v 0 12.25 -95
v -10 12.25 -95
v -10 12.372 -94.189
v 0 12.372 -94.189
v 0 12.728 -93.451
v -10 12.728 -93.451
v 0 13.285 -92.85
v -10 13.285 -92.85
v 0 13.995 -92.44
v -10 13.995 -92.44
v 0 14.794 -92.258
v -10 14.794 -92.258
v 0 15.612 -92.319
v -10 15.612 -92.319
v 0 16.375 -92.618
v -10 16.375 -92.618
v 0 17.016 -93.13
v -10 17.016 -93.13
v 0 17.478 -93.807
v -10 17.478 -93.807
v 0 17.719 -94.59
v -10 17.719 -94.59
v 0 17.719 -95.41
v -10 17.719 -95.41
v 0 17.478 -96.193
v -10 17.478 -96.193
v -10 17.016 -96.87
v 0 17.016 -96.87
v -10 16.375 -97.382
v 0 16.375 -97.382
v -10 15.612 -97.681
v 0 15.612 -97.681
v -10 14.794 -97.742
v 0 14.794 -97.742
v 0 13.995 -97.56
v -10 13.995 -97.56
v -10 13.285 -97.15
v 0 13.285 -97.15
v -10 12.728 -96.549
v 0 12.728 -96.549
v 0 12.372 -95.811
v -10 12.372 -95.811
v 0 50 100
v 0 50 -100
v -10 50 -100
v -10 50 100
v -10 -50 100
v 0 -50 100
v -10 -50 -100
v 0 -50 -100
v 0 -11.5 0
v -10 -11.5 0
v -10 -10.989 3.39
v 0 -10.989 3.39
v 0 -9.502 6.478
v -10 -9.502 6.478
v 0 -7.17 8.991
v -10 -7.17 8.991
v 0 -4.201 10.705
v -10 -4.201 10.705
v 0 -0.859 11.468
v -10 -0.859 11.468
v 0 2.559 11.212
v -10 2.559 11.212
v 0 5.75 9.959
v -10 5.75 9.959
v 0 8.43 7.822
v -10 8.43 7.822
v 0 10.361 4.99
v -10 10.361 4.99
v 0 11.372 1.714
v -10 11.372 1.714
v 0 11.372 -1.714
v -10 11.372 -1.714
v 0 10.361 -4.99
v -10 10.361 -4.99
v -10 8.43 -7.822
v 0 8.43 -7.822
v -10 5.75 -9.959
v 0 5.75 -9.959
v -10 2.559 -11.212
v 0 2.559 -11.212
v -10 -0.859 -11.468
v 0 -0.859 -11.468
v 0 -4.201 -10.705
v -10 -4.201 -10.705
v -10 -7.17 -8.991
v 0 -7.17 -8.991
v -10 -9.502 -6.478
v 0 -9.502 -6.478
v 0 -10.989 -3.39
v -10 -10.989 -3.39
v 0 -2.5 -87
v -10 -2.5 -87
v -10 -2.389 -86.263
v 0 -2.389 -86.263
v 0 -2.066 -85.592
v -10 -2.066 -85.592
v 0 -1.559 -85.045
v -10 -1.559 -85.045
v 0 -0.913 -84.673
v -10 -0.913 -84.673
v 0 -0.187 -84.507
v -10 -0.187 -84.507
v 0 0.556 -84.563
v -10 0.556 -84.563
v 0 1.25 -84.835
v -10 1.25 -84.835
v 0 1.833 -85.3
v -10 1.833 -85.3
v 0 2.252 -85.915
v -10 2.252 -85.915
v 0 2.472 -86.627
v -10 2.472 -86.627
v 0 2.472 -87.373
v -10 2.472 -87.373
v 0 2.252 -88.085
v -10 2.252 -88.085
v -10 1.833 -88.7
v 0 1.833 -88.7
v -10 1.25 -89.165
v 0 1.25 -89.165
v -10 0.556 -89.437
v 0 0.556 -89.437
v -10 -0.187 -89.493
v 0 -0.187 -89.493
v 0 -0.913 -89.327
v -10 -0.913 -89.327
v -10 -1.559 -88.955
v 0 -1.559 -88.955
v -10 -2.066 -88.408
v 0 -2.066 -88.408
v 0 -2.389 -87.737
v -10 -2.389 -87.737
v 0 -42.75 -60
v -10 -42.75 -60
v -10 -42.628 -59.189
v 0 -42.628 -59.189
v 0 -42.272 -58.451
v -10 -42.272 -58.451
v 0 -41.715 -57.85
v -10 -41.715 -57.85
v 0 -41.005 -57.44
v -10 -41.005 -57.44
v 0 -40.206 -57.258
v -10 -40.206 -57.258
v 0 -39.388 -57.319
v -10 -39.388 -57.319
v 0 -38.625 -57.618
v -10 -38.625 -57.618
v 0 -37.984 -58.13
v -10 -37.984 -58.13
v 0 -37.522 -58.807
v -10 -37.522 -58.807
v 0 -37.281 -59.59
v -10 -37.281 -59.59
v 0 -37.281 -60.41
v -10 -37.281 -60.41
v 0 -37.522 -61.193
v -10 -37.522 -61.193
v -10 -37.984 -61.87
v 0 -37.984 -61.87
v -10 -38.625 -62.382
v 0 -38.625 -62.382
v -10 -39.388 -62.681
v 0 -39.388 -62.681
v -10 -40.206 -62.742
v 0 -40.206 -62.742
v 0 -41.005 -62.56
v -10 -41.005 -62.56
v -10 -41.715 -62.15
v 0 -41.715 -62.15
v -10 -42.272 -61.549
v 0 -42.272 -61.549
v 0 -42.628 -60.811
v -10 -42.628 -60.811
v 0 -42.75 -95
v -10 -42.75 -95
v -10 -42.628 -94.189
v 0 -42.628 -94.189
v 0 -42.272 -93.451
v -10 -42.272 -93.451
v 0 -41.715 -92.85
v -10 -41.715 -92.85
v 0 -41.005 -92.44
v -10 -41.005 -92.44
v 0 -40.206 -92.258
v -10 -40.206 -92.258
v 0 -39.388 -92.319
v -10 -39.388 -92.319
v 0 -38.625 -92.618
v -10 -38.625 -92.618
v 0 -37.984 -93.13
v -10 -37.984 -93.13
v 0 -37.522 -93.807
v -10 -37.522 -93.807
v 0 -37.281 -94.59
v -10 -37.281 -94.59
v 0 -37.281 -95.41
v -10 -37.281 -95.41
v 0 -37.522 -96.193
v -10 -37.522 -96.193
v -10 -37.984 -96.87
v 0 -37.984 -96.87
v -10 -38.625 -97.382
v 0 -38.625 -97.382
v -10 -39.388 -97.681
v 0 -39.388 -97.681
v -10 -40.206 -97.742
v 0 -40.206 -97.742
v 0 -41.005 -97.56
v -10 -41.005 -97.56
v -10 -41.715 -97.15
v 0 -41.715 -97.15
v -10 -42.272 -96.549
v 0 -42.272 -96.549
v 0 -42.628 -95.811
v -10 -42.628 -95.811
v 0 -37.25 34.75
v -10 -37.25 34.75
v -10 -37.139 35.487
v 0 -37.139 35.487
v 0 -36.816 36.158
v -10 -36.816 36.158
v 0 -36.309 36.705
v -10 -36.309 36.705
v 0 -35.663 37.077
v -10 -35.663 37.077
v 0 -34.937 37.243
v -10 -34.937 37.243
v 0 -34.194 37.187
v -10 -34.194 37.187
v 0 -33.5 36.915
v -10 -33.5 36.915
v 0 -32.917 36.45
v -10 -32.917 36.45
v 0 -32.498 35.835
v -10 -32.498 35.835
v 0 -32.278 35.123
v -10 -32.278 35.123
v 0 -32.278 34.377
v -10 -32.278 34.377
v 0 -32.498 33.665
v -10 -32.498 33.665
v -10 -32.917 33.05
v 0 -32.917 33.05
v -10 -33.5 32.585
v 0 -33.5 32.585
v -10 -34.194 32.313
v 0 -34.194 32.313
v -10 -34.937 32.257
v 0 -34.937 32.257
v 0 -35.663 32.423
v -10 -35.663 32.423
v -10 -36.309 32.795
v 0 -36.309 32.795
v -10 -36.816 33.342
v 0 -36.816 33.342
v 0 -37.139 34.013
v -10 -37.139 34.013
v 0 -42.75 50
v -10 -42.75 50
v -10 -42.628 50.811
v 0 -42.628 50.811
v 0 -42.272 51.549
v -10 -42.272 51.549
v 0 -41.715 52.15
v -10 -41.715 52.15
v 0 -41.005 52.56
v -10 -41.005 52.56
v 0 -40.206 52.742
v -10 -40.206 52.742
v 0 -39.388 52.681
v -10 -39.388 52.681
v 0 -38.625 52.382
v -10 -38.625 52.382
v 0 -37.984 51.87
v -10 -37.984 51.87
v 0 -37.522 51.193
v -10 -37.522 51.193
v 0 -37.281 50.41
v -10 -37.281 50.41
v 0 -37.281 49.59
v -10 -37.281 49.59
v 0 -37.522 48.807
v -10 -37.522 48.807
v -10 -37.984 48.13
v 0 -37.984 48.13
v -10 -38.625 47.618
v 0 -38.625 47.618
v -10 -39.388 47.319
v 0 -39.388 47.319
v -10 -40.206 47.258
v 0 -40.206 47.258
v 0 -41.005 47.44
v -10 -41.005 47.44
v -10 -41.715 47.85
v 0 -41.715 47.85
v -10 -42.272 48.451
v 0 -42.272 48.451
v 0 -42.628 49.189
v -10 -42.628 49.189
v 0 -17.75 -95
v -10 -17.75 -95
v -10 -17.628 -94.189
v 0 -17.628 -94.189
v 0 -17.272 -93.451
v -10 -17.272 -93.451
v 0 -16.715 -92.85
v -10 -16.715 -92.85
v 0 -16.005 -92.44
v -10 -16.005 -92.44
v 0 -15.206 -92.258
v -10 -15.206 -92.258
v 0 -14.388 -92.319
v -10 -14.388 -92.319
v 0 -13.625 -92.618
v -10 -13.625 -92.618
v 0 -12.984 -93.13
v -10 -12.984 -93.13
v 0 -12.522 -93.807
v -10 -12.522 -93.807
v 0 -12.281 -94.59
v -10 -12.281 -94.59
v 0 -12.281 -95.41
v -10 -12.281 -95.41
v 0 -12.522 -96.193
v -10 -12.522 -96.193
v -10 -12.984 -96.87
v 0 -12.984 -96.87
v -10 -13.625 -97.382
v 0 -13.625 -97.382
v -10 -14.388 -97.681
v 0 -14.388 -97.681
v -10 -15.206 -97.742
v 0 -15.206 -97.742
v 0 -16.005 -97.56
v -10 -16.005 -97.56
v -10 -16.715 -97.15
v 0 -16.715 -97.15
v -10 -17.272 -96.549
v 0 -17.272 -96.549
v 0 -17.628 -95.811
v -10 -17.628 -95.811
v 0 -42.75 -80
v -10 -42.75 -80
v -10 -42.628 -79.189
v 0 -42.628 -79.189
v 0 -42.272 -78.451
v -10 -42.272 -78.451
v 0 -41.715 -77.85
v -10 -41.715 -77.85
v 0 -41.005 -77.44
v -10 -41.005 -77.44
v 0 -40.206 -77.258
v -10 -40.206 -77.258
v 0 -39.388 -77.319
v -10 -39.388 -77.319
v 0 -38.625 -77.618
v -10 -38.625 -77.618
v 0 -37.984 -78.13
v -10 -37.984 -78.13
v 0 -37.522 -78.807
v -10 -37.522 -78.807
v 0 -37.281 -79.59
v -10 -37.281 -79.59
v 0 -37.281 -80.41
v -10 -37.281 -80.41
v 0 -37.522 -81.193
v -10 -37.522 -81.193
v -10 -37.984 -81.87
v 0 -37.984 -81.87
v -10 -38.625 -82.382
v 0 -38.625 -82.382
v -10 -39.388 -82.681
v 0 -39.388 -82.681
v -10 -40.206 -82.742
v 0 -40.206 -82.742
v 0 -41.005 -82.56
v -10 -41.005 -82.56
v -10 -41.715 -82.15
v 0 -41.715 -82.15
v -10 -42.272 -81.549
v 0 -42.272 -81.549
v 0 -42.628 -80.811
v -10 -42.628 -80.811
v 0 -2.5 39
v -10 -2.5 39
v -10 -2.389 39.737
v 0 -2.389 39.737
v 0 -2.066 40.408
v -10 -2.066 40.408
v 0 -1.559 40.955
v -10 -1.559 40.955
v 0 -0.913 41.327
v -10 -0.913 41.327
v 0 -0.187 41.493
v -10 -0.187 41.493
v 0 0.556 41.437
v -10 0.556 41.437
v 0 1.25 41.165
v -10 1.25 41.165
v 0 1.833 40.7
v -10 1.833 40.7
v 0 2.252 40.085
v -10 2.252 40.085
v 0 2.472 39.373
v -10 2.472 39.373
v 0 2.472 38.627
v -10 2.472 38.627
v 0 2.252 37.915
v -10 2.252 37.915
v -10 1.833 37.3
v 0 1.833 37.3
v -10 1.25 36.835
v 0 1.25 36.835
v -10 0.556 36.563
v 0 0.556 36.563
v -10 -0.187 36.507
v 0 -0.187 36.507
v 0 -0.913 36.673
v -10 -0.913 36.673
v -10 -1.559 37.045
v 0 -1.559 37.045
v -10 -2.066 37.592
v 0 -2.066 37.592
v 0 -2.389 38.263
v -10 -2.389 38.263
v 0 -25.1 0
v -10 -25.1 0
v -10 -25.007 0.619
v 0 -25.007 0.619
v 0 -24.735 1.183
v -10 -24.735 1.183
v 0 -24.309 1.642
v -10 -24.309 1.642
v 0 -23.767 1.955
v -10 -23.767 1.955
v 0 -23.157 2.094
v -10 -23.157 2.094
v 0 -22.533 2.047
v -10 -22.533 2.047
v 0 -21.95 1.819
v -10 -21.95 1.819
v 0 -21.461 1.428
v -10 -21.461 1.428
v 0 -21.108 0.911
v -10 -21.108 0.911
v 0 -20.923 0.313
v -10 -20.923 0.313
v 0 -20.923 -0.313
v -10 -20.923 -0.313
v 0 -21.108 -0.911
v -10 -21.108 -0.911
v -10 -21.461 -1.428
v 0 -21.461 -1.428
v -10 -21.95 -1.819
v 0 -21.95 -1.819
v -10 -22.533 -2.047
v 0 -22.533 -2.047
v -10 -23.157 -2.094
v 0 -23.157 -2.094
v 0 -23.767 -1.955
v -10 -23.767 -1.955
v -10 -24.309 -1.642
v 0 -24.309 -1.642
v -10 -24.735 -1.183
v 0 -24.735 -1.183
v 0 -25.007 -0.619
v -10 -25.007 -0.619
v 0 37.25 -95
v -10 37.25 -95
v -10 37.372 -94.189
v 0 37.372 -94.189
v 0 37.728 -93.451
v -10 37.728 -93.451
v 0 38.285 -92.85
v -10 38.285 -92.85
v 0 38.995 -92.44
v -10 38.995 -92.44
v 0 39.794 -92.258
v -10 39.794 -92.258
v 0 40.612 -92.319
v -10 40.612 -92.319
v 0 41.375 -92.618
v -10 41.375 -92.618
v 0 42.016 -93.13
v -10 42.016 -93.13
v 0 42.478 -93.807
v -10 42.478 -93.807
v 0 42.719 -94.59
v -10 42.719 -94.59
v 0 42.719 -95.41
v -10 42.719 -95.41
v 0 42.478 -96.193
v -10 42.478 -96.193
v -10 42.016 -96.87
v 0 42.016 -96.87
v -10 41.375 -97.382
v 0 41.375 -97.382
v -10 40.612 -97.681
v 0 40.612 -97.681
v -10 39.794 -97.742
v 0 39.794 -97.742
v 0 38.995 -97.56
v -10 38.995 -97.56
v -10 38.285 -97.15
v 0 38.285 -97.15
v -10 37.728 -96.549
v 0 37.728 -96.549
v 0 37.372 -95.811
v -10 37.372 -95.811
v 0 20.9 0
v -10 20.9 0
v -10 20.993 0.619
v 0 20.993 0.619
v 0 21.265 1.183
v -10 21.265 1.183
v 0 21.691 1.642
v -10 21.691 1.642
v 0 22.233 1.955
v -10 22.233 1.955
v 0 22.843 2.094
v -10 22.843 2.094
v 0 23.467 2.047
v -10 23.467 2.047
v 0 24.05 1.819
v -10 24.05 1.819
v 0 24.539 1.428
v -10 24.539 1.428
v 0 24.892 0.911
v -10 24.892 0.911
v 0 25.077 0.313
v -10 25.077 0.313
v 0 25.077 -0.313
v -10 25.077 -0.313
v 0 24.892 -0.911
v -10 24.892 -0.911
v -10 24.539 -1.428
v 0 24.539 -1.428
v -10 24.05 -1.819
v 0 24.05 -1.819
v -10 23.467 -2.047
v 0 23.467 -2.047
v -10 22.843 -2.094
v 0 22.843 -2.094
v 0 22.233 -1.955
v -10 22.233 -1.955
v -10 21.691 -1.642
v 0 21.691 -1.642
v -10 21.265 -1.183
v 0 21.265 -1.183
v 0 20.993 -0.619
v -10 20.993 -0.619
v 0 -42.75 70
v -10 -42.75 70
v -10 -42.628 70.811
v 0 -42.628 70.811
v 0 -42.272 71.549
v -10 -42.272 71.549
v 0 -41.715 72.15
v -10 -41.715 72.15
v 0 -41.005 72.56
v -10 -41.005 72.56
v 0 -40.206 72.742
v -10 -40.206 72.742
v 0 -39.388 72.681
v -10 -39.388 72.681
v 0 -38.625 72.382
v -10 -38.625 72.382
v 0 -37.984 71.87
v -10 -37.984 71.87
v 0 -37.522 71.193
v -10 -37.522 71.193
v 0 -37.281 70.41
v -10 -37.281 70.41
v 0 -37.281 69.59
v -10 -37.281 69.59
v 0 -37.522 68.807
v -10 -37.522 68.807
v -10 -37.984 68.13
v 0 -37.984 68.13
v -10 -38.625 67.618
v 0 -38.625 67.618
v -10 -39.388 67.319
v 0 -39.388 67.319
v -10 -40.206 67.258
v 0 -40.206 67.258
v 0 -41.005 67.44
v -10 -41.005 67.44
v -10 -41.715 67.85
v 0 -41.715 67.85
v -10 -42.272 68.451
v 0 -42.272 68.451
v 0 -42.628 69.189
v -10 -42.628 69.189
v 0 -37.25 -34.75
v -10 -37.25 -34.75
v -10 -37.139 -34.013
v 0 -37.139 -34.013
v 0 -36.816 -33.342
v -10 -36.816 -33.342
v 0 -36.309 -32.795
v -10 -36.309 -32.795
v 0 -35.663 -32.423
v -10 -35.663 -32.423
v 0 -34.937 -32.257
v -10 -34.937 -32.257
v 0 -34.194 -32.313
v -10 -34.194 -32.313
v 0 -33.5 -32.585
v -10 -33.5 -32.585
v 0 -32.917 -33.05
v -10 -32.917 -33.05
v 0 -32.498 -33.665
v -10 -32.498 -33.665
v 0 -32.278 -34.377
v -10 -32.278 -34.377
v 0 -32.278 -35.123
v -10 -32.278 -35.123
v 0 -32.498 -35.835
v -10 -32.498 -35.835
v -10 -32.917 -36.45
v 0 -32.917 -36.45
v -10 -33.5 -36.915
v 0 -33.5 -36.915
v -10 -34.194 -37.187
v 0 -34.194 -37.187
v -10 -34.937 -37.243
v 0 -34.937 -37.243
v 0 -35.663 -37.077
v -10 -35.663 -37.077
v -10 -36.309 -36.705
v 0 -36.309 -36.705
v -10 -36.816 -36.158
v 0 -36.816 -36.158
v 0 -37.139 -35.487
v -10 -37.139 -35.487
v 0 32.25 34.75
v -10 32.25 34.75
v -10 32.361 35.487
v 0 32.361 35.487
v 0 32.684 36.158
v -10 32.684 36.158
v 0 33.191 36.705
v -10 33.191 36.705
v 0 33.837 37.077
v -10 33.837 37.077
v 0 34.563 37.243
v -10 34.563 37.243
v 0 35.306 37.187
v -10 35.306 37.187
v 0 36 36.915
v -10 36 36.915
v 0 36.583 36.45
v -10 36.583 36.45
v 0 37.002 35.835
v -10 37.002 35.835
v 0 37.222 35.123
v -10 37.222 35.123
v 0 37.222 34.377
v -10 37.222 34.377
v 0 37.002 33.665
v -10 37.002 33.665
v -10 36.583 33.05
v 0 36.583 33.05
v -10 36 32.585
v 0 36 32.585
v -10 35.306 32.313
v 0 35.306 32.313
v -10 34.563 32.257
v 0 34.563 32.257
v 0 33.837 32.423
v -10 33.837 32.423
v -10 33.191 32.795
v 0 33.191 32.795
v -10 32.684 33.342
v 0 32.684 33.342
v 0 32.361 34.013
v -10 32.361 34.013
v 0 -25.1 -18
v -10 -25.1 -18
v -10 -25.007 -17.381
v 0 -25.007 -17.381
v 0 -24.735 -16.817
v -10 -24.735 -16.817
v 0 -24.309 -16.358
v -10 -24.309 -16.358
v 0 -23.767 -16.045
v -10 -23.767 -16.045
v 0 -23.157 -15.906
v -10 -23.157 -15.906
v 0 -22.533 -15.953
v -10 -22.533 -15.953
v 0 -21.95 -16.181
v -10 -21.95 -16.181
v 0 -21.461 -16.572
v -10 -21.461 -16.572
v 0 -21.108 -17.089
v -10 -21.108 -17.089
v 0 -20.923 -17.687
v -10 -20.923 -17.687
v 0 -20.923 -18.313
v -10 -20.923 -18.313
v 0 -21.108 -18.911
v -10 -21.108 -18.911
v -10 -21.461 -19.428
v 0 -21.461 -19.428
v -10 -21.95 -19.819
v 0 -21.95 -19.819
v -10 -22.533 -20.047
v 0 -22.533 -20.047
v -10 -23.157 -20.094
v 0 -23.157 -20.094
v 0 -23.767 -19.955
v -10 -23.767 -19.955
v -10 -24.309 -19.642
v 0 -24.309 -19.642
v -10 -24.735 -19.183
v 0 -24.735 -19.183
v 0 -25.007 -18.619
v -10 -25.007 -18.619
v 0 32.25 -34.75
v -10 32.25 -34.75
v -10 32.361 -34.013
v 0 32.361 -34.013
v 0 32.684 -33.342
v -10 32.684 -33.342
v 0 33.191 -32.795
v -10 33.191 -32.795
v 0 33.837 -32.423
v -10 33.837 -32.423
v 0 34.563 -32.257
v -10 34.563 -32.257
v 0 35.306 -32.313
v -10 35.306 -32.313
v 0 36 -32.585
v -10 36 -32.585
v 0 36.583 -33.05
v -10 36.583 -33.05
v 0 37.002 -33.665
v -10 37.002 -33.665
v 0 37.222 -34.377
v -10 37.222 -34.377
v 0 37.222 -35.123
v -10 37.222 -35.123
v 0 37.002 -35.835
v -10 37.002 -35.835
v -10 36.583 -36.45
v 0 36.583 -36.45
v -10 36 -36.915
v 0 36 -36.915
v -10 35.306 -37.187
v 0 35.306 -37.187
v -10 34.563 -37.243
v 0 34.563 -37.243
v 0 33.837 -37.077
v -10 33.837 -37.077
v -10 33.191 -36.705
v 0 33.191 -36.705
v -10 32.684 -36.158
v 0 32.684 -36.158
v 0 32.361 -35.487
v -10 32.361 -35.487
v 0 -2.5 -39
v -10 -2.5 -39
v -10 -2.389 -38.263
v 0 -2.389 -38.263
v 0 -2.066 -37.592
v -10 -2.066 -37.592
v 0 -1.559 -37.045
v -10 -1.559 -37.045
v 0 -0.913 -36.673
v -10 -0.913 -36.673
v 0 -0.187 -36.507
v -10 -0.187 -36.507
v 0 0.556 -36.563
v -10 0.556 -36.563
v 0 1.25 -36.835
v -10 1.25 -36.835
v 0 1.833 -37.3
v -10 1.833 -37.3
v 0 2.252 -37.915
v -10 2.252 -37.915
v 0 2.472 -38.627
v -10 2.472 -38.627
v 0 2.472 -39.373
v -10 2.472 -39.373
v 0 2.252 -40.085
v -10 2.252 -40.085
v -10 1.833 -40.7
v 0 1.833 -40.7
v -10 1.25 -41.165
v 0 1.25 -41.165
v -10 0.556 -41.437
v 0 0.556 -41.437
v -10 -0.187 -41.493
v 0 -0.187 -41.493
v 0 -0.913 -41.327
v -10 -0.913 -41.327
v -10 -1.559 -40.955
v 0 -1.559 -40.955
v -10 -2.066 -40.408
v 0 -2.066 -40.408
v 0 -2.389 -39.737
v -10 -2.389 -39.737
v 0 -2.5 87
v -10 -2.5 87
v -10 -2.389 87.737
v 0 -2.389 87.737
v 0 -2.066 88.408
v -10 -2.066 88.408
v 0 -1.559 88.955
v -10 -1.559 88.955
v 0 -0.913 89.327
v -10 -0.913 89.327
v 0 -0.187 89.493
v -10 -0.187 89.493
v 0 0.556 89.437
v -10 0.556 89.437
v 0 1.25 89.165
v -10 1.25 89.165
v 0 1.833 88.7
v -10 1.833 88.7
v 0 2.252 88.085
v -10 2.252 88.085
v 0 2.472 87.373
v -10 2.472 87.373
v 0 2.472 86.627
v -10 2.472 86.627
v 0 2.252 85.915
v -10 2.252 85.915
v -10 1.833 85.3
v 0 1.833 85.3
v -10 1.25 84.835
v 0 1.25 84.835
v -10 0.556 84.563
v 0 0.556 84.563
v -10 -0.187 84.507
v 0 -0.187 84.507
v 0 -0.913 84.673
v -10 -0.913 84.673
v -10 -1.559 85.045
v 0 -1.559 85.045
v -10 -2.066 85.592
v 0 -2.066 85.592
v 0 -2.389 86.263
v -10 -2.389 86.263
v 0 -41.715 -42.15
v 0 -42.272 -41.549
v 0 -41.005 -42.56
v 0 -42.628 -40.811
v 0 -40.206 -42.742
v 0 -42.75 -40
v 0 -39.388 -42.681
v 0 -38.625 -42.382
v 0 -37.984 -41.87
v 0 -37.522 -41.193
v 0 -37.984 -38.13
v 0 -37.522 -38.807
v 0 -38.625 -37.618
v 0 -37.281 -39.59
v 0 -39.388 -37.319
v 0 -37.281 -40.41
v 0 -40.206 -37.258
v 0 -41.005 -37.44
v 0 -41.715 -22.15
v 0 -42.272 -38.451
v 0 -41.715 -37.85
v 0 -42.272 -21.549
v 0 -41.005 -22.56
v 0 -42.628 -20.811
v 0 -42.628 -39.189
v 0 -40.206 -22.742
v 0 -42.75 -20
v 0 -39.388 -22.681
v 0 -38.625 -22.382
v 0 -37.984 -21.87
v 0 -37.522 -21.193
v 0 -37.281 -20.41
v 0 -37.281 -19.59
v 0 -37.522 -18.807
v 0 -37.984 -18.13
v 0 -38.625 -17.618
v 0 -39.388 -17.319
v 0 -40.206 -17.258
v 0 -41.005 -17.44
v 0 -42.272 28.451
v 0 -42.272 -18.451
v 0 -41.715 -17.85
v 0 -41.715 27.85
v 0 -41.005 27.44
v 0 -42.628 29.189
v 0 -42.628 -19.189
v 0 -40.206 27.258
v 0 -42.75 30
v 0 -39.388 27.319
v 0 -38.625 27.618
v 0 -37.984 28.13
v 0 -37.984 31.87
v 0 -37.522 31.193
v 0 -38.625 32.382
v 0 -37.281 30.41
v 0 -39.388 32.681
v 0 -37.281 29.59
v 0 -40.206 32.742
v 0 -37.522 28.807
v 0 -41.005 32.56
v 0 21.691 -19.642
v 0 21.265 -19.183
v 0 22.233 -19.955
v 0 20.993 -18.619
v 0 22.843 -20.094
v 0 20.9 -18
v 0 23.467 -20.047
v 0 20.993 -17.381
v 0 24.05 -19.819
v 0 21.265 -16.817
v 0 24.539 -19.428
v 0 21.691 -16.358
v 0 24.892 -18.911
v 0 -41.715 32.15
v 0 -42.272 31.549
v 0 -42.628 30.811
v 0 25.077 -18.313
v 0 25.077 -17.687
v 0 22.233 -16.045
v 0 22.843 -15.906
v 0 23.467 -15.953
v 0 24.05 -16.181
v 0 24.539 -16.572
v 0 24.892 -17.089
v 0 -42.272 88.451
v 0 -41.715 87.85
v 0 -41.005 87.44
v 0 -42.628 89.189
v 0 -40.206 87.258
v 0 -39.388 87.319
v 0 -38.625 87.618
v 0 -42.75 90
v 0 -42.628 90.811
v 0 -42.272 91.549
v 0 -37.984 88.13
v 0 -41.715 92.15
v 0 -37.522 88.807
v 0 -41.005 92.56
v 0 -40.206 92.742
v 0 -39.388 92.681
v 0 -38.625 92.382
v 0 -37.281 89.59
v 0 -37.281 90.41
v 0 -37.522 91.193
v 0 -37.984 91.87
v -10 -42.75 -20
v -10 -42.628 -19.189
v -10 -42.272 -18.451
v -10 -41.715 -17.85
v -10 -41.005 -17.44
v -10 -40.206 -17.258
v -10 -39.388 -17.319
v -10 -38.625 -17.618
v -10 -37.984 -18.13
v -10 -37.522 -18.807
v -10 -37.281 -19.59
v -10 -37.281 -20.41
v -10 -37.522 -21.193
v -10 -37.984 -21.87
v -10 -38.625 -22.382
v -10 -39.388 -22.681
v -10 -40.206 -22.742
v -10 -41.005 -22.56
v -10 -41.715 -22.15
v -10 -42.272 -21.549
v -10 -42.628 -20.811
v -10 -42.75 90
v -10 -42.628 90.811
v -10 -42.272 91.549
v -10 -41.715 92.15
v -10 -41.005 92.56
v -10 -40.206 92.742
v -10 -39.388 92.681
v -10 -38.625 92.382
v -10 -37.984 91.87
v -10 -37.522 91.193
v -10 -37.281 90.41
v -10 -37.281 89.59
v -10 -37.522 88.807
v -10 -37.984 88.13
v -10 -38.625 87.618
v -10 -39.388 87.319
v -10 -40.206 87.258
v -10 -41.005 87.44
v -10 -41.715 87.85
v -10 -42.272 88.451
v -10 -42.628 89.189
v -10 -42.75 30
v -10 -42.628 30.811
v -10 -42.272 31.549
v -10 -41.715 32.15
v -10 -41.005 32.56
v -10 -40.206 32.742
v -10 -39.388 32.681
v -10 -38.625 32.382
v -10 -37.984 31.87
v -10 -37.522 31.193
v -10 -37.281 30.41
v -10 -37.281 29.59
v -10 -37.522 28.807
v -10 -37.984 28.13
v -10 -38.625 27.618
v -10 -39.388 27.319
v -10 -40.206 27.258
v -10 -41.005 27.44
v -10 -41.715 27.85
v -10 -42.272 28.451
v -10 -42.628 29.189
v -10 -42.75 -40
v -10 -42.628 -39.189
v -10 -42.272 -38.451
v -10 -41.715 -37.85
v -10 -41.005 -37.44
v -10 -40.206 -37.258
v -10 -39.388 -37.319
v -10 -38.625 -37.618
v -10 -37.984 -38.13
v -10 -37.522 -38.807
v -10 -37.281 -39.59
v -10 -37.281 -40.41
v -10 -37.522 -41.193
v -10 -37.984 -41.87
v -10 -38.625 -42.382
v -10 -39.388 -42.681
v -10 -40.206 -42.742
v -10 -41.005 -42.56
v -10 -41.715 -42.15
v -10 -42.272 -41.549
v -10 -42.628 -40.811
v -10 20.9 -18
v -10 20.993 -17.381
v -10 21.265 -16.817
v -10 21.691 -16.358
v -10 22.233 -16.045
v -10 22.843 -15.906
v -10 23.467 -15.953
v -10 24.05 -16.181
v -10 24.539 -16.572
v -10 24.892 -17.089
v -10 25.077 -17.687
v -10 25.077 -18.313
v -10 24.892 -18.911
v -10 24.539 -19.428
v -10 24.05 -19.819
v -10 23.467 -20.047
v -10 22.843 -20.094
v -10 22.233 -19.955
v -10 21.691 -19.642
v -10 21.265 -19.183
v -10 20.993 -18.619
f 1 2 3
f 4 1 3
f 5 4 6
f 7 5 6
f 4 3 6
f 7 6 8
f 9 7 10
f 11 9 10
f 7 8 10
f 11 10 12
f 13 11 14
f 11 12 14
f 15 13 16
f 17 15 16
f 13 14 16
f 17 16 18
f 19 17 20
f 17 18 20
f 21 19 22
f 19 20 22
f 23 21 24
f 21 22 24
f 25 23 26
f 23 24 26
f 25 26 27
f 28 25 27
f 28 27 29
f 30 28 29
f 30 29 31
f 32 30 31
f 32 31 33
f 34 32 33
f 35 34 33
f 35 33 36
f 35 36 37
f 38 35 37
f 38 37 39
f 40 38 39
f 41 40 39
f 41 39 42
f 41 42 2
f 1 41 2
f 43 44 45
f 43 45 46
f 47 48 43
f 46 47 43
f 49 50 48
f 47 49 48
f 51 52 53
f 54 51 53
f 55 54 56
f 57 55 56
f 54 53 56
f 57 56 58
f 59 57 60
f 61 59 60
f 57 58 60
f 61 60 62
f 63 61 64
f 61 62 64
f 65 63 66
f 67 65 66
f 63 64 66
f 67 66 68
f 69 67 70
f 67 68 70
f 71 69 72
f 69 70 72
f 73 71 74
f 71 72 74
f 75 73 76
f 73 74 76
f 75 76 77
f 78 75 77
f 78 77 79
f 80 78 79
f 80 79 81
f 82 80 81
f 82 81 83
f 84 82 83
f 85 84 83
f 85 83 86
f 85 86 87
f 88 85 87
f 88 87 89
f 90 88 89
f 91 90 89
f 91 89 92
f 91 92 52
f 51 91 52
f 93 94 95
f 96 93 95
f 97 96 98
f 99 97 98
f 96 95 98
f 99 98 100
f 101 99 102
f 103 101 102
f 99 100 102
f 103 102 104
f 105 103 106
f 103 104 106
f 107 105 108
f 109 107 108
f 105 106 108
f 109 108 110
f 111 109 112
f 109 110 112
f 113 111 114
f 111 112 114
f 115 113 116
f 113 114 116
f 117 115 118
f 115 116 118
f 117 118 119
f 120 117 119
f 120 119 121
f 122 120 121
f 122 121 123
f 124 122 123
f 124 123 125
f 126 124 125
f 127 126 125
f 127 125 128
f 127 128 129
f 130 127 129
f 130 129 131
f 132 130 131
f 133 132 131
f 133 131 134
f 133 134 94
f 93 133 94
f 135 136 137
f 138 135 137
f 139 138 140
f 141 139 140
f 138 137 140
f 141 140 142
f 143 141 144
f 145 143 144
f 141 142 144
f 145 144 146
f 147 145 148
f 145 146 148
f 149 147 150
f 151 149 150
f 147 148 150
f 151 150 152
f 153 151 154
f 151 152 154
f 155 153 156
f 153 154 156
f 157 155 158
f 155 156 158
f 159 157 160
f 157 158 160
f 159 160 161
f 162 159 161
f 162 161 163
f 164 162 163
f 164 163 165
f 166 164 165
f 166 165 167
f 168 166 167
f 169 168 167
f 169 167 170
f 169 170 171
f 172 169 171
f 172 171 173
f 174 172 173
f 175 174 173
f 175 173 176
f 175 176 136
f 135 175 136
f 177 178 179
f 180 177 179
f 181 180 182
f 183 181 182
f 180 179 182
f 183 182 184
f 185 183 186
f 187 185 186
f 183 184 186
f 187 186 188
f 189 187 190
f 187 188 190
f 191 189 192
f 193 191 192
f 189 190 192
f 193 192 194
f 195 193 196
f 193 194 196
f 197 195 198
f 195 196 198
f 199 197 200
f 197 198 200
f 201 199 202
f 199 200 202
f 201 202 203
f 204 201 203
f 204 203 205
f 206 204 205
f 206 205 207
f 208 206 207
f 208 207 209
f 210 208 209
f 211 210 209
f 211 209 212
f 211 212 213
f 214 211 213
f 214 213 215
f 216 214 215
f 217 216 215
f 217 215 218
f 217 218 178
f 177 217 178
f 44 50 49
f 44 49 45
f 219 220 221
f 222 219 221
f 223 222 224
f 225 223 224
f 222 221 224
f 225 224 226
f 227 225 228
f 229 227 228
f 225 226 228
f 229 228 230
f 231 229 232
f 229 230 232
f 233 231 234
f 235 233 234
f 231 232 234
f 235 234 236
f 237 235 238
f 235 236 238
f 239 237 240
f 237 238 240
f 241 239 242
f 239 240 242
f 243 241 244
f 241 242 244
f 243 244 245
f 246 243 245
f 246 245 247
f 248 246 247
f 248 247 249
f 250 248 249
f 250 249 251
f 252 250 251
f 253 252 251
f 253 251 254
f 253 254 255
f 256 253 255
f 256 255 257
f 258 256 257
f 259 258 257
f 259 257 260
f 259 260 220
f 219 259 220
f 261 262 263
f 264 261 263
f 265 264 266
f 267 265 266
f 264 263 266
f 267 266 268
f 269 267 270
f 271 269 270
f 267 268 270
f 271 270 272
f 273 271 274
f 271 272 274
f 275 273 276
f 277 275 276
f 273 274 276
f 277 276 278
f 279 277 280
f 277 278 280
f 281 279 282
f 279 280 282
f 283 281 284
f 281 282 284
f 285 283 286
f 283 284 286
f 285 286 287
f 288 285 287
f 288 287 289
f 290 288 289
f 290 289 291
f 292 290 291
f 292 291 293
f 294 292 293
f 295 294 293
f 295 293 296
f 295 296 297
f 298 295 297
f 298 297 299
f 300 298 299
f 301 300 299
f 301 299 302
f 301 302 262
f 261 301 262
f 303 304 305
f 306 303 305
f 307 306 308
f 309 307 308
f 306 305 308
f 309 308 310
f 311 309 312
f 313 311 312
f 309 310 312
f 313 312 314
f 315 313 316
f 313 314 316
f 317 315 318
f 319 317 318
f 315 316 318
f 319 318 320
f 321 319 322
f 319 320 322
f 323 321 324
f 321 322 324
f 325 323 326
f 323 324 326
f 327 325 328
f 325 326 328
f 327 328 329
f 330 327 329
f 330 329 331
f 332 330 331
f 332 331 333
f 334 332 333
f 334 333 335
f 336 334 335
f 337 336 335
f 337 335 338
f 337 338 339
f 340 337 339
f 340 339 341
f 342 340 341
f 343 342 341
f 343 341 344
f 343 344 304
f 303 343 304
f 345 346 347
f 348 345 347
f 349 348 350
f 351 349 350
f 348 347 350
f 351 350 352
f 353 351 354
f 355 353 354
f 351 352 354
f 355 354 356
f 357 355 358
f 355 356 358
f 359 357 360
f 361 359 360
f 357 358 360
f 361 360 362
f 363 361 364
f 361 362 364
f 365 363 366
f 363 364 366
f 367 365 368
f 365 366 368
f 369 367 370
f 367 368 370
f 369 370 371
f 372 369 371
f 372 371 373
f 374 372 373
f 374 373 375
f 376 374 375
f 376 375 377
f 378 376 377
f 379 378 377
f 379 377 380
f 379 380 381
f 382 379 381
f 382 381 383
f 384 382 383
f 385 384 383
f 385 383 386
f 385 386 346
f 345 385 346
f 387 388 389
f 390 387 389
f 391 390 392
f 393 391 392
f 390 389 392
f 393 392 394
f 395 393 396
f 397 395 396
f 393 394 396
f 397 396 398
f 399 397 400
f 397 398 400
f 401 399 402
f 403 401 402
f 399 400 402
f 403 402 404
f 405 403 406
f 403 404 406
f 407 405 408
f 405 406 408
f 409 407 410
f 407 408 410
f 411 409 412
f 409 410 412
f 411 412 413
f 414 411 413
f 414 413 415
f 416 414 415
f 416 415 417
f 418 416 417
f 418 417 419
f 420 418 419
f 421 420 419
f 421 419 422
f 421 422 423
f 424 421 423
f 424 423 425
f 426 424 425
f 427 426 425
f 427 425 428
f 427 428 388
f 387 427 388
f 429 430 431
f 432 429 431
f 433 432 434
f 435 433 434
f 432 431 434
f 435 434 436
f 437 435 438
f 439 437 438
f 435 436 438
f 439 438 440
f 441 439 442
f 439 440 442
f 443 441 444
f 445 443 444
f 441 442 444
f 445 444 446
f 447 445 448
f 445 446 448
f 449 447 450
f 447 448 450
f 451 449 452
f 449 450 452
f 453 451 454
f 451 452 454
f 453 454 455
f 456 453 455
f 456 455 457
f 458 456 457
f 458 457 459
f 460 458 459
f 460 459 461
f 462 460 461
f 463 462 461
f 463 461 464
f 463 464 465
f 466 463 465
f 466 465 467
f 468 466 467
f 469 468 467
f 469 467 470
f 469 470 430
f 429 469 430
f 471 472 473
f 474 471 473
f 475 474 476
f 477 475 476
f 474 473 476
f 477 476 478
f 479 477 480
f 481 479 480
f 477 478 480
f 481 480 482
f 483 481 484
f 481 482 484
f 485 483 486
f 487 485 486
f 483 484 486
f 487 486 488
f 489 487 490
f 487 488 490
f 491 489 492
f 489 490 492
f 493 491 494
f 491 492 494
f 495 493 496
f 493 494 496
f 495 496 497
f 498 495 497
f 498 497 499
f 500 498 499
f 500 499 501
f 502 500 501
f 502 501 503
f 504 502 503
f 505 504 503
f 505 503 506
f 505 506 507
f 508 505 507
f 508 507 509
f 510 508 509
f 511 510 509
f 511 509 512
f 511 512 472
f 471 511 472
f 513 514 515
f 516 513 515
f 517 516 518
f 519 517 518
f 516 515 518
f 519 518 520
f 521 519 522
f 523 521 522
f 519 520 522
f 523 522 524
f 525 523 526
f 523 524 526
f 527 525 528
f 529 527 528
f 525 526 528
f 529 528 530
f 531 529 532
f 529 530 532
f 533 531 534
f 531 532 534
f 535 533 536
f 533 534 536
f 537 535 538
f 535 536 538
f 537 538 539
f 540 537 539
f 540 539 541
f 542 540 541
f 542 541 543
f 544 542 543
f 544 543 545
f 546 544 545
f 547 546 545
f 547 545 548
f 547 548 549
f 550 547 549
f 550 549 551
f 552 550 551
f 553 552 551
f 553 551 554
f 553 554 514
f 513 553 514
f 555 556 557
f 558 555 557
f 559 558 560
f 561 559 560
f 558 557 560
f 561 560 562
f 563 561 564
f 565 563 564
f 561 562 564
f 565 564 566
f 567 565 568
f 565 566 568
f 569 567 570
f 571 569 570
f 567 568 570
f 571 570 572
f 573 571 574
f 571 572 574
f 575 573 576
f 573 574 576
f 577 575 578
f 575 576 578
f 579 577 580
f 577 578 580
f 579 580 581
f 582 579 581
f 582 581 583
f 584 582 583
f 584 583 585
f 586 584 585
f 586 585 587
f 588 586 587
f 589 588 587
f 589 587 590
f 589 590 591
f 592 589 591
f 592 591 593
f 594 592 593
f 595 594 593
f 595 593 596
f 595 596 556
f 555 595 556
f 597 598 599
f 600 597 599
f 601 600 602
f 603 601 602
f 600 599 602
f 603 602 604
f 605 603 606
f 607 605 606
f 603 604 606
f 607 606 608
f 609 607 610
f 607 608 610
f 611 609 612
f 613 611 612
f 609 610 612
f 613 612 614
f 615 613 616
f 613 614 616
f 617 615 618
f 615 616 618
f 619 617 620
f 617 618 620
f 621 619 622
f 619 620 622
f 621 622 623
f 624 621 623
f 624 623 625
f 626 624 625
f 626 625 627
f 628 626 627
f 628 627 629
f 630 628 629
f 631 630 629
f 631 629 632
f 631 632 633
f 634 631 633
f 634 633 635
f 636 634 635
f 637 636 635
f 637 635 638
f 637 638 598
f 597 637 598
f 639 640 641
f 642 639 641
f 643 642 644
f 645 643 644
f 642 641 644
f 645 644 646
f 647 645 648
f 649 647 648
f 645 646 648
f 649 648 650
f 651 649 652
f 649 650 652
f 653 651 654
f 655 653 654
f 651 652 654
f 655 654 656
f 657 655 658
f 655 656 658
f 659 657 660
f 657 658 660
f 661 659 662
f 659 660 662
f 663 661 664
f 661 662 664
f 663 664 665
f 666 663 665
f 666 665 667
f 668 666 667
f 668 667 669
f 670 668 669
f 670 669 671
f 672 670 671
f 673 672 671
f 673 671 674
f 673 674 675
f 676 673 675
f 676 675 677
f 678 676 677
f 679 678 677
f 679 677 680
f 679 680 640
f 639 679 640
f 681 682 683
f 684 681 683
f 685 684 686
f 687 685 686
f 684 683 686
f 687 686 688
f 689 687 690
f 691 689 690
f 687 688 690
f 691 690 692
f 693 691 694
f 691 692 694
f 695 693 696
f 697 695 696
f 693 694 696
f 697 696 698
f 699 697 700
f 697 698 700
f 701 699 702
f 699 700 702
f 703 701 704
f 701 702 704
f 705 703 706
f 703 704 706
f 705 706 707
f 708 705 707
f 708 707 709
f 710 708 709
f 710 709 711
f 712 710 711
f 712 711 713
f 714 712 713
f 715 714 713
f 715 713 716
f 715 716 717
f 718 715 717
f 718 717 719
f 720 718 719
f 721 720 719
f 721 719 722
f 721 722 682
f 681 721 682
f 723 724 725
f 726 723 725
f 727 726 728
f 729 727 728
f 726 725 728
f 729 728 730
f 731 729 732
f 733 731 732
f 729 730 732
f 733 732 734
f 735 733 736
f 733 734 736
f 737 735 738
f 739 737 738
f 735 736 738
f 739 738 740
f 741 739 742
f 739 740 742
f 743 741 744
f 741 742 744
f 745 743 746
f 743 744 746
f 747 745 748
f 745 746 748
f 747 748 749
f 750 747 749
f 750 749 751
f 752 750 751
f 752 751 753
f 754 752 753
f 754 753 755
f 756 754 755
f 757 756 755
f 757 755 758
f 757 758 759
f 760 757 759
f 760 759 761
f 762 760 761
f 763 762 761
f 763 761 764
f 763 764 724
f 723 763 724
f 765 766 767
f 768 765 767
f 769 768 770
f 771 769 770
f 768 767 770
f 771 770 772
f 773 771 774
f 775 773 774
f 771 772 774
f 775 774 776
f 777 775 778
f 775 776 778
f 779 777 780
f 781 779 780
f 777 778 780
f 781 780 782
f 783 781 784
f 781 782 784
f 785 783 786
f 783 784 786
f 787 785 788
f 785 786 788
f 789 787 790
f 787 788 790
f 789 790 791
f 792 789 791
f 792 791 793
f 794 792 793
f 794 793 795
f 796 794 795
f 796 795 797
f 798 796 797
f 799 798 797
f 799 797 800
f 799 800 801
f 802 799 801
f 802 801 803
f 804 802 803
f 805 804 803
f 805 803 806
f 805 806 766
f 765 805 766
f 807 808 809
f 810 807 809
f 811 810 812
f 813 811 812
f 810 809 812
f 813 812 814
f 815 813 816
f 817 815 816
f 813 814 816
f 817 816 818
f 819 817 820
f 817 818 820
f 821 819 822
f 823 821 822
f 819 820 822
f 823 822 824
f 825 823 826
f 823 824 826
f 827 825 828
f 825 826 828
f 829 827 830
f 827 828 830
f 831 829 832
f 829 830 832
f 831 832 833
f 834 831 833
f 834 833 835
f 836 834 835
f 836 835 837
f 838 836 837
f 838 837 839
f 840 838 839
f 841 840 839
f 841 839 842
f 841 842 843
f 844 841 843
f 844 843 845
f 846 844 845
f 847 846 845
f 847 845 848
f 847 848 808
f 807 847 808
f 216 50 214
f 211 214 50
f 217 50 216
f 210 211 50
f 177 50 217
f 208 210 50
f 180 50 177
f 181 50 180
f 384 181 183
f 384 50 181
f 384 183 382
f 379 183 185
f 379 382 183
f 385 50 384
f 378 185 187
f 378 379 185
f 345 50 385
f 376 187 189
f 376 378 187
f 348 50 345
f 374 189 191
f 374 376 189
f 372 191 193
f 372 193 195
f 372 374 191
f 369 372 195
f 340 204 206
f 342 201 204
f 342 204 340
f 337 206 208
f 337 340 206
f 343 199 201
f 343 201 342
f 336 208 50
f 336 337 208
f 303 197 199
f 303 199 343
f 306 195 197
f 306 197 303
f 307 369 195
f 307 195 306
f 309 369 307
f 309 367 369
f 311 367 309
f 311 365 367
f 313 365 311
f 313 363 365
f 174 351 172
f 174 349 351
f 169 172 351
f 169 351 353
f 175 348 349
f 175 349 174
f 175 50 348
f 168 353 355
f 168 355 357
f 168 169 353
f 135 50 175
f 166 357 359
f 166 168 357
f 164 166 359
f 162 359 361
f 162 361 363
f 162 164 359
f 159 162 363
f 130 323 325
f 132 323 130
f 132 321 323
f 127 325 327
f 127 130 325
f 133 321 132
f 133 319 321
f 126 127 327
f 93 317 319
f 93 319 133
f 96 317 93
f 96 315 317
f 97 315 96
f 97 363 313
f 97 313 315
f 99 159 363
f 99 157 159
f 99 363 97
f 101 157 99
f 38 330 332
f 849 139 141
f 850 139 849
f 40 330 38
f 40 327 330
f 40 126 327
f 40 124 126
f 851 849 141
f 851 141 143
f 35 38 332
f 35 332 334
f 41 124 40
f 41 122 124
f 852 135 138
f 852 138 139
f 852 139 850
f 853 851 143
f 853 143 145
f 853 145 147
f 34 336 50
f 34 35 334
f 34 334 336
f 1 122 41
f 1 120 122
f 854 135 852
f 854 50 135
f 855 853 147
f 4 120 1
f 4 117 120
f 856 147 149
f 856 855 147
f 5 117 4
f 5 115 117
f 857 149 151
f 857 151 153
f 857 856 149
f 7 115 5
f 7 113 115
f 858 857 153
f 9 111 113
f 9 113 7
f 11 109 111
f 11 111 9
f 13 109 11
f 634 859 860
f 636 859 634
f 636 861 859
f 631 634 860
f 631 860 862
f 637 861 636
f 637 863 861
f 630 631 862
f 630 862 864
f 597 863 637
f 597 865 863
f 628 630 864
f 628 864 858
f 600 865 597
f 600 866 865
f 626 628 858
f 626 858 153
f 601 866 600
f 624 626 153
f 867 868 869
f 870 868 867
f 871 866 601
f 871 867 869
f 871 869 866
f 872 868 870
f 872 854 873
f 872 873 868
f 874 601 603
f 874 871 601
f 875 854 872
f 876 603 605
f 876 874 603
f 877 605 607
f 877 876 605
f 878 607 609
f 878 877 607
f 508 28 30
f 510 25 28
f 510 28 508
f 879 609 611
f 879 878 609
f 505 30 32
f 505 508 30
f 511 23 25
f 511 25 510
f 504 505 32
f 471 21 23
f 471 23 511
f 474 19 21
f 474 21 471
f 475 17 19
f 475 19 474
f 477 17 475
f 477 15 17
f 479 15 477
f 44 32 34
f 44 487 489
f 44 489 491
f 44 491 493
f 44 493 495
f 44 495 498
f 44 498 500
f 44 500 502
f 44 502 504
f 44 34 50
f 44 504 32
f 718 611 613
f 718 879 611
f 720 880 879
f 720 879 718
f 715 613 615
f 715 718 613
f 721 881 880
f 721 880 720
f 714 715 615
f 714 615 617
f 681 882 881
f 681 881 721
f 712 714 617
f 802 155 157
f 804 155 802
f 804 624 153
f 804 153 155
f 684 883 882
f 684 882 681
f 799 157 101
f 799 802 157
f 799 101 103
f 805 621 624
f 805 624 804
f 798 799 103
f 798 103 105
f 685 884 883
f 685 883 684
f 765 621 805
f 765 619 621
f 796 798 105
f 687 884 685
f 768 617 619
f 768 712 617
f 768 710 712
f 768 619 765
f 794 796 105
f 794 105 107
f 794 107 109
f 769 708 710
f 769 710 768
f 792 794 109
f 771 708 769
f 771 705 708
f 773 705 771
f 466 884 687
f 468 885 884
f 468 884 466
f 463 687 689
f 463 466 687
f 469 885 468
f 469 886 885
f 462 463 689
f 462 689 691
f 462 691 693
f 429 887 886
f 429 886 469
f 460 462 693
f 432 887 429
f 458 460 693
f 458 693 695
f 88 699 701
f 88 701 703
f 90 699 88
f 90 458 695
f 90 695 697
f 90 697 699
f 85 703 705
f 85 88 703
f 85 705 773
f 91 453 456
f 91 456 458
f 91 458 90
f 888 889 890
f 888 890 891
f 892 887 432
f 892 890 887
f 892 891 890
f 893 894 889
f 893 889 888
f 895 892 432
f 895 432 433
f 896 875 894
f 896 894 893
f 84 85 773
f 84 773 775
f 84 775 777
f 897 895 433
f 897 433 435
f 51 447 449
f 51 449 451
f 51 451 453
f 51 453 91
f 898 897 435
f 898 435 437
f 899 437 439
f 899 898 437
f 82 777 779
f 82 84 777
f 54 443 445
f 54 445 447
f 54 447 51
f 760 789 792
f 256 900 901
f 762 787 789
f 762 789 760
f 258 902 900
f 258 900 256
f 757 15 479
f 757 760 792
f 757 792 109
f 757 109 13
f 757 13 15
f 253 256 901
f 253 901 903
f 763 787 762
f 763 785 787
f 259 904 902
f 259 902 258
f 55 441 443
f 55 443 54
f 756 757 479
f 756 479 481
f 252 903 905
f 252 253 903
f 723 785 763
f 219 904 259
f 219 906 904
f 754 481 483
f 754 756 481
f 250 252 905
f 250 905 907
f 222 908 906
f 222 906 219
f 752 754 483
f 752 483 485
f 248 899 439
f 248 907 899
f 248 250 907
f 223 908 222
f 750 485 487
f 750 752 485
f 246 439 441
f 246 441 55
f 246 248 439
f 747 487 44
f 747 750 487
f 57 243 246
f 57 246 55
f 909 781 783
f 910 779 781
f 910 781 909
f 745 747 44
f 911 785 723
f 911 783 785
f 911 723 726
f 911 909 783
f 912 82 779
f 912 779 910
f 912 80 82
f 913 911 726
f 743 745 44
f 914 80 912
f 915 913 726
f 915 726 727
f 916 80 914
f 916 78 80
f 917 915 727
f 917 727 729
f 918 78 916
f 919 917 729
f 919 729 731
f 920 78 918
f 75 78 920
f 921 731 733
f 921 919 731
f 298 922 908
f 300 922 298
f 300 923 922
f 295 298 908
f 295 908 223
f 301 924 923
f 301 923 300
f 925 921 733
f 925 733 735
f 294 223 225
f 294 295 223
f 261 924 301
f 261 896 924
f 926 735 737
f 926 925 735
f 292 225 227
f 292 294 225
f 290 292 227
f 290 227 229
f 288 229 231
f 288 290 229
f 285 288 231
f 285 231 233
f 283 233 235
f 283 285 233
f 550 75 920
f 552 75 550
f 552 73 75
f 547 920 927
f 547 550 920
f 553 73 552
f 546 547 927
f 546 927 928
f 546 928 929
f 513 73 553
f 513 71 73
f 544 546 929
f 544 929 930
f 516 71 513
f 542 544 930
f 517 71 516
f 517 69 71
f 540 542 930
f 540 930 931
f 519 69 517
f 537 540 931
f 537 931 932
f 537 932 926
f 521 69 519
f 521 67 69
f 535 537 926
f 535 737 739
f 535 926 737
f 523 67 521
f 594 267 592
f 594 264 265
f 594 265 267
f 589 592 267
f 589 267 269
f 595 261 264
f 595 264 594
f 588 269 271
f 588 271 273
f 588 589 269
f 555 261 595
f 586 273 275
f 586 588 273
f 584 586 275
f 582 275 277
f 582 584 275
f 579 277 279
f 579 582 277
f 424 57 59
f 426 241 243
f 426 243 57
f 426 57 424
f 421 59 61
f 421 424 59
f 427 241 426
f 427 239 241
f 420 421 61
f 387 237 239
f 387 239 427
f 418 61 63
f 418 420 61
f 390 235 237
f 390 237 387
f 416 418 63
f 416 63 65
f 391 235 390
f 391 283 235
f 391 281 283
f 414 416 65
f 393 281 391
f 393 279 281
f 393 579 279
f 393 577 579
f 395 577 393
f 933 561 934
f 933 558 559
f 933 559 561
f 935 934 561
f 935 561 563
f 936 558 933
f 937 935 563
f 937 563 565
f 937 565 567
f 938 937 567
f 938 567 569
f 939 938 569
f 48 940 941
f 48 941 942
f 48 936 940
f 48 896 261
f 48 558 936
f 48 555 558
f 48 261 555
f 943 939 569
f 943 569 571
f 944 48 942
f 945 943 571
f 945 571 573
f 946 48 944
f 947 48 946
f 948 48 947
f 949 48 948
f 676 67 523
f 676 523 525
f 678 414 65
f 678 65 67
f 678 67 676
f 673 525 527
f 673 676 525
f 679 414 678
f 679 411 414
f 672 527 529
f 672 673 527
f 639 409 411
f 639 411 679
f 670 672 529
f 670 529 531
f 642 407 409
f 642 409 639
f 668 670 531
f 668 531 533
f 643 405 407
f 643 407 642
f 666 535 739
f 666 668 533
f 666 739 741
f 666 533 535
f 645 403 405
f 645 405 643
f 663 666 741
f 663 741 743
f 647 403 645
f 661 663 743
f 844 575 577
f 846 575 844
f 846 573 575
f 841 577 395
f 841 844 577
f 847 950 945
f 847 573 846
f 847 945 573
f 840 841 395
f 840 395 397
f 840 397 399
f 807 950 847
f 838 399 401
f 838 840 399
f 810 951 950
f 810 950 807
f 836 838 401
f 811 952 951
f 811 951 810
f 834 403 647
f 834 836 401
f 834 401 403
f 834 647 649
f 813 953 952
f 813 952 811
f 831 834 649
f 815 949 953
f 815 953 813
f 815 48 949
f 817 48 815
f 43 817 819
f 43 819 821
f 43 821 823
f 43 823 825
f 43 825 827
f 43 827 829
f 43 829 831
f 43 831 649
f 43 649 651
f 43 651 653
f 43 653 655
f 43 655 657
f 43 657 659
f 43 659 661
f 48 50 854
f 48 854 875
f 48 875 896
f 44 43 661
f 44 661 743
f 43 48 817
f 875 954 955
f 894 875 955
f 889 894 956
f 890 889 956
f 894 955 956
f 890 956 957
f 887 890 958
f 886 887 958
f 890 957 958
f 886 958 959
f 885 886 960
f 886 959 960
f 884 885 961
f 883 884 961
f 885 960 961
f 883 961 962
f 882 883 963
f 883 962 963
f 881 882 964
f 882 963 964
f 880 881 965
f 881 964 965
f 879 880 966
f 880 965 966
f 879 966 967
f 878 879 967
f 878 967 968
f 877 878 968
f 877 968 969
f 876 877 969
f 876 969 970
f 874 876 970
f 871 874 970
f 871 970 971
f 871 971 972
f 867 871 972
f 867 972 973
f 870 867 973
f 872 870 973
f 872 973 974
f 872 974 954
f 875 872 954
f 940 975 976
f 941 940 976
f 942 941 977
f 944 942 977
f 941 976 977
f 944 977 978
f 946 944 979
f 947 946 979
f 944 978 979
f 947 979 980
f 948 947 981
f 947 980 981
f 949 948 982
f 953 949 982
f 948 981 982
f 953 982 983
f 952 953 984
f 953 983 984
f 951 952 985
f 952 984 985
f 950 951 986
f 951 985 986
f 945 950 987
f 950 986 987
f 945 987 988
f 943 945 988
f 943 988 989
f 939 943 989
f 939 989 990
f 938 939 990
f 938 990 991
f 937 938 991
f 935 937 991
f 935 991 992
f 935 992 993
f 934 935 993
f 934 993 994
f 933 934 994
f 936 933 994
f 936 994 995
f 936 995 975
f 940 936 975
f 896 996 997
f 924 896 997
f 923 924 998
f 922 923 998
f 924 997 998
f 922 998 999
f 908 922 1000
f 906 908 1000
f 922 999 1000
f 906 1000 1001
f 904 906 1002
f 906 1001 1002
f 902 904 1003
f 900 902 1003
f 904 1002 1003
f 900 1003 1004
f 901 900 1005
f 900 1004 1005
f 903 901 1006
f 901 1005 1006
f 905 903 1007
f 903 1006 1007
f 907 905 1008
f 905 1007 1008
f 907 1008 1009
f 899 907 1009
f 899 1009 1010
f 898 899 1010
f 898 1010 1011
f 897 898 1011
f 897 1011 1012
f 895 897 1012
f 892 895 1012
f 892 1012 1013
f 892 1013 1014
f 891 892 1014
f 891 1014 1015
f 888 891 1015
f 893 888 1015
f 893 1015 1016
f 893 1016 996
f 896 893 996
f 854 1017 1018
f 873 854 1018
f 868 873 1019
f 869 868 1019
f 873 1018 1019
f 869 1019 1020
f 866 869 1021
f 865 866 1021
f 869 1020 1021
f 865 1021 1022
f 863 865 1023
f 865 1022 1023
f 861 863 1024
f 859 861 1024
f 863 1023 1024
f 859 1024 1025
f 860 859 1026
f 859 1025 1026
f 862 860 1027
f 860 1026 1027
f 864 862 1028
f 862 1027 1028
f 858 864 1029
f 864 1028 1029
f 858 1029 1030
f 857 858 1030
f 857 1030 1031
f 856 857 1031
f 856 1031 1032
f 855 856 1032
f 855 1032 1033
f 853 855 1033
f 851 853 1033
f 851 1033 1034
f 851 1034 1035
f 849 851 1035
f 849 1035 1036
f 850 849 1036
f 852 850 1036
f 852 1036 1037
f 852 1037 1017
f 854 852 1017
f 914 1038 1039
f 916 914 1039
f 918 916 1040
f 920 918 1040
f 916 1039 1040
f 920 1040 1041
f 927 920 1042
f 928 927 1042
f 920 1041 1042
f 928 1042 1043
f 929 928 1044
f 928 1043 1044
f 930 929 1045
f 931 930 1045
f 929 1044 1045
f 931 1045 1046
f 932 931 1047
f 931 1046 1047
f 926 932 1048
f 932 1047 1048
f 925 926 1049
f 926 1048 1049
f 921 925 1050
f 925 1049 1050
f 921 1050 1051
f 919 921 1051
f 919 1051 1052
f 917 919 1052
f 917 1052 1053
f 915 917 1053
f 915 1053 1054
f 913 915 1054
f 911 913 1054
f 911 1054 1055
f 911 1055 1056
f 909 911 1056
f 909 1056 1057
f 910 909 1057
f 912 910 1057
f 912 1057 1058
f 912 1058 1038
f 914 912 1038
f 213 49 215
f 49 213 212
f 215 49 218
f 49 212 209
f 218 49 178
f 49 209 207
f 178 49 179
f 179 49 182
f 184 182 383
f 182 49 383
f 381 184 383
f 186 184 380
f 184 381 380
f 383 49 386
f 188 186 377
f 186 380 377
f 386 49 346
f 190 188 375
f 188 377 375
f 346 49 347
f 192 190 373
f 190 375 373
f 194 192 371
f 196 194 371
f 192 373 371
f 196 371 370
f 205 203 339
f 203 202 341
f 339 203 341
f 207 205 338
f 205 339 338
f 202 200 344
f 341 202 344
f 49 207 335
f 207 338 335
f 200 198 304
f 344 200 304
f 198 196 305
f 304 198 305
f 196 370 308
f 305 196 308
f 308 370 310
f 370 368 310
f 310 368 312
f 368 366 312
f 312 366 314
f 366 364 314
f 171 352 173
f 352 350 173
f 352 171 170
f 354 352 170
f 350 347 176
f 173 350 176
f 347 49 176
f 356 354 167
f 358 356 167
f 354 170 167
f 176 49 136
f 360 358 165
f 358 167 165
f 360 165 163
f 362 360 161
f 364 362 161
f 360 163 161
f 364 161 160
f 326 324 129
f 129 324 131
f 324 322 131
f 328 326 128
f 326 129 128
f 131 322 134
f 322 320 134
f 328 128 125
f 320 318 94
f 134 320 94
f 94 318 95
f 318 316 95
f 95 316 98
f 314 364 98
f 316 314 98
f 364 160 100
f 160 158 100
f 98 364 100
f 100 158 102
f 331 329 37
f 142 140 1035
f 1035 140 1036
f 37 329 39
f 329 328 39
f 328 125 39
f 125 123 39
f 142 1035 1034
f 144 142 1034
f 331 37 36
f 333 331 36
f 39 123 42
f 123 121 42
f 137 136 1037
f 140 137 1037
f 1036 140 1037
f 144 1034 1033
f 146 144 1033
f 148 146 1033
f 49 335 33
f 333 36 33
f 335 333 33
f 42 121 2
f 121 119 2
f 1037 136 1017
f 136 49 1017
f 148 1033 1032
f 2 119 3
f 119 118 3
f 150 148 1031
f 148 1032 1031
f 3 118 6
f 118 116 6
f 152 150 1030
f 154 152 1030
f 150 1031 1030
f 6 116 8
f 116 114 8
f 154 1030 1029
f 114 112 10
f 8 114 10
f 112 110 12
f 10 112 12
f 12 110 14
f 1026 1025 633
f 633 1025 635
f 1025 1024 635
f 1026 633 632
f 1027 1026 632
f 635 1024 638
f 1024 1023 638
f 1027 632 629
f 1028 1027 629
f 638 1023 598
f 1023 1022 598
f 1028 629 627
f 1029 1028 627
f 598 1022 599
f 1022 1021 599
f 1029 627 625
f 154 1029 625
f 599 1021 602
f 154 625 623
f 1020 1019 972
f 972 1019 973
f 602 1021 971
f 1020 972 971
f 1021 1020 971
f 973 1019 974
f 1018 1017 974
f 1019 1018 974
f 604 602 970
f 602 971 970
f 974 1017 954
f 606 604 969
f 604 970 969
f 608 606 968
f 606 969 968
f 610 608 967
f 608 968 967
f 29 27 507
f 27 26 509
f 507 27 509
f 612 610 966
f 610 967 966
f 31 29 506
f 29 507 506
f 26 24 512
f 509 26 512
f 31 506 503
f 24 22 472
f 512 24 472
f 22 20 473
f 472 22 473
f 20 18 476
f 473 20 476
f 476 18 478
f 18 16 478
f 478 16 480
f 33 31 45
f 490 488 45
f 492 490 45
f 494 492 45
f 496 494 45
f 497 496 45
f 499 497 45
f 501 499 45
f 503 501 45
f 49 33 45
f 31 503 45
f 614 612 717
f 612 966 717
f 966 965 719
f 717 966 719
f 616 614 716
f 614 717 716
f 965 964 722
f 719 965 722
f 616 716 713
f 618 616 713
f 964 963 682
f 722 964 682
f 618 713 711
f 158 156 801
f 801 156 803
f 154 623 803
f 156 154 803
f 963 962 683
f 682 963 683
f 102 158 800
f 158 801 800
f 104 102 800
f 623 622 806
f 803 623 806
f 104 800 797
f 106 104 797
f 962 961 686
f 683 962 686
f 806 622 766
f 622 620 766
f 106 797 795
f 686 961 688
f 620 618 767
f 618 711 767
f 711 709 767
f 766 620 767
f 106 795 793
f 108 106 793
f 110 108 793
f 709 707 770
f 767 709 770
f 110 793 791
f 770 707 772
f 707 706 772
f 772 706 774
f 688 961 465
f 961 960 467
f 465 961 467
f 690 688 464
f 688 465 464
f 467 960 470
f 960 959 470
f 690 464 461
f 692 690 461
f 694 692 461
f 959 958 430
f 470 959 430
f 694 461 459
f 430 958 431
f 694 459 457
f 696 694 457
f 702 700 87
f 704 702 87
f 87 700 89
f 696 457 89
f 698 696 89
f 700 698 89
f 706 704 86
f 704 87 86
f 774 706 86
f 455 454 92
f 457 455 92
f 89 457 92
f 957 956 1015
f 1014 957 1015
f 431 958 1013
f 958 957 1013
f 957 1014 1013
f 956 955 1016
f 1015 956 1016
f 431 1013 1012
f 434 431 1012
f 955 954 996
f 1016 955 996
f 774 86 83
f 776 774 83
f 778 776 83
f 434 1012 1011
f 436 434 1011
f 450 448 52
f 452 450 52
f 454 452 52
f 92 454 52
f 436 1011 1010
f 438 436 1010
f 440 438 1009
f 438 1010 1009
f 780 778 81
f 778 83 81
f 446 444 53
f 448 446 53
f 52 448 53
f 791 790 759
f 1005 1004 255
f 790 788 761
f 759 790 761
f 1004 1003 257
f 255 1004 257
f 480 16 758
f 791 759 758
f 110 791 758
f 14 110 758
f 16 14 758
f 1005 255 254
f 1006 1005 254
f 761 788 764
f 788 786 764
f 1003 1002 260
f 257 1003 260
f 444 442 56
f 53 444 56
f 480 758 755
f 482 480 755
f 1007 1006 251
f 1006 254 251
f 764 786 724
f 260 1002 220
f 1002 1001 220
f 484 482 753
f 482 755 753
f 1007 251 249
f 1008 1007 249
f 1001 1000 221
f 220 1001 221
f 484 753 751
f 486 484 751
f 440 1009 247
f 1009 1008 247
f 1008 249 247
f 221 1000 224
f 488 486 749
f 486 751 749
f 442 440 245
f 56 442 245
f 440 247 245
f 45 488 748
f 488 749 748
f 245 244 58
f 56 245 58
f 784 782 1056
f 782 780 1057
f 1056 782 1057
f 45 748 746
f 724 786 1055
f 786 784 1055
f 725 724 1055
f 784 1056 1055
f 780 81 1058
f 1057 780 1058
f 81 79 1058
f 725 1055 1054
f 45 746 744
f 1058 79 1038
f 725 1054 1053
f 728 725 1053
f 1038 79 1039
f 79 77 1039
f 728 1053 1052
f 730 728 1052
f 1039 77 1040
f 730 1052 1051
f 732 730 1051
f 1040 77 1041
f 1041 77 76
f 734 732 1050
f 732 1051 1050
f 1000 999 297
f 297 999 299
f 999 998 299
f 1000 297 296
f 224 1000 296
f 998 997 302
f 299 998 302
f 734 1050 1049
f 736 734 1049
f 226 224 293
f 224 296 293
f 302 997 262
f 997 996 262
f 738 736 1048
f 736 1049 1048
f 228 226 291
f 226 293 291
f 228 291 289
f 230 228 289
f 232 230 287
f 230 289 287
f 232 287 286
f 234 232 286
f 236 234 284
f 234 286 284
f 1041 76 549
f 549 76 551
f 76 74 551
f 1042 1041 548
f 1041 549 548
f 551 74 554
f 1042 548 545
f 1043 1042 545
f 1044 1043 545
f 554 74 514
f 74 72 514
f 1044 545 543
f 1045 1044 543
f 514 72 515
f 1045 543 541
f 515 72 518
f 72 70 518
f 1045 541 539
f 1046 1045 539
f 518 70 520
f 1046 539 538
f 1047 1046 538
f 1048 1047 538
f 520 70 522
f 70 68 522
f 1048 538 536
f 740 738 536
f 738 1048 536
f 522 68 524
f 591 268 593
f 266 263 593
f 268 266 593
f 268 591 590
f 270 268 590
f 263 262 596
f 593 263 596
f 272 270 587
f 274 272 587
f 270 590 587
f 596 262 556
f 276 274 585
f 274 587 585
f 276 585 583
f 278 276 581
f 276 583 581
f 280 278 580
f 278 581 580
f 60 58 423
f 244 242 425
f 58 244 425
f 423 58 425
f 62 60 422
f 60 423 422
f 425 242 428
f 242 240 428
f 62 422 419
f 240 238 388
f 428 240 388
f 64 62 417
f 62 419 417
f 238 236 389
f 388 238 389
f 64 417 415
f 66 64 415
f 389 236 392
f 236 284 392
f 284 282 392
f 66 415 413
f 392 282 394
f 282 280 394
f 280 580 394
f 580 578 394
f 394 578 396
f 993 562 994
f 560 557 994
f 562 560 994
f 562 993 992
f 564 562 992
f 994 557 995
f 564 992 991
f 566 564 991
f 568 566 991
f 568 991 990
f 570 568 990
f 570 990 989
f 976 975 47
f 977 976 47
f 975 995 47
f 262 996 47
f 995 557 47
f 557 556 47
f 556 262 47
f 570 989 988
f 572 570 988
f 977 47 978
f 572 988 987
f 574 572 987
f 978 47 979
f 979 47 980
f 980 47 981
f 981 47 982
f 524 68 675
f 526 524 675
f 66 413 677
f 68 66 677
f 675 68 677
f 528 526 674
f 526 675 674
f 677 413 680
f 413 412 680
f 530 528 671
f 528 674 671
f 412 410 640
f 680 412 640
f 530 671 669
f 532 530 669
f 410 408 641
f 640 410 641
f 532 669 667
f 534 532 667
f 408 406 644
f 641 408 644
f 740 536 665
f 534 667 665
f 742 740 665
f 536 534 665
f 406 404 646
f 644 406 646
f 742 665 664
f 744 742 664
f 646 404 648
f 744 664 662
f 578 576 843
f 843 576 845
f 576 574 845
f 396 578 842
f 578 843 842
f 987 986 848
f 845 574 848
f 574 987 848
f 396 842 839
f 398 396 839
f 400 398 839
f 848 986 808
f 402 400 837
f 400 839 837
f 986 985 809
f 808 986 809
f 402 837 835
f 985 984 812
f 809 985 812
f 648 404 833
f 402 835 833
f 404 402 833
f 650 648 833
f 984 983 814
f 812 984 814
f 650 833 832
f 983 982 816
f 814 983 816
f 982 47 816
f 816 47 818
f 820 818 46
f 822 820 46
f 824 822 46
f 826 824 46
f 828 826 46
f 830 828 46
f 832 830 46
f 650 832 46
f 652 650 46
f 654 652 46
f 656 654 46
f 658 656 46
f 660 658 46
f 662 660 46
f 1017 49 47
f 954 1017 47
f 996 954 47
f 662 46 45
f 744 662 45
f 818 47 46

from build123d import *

# Parameters (mm, degrees)
F0_W     = 100
F0_H     = 200
F1_DEPTH = 10
F2_D     = 5
F3_D     = 4.2
F4_D     = 23
F5_D     = 5.5
F6_D     = 5.5
F7_D     = 5
F7_DEPTH = 15
F7_TIP   = 1.5021515476


with BuildPart() as f1:
    # F0 (on Right) → F1 (new body)
    with BuildSketch(Plane.YZ):
        Rectangle(F0_W, F0_H)
    extrude(amount=-F1_DEPTH)

    # F2 (through all)
    with Locations(Plane.YZ):
        with Locations((0, 39), (0, 87), (0, -39), (0, -87)):
            Hole(F2_D / 2)

    # F3 (through all)
    with Locations(Plane.YZ):
        with Locations((-23, -18), (-23, 0), (23, 0), (23, -18)):
            Hole(F3_D / 2)

    # F4 (through all)
    with Locations(Plane.YZ):
        with Locations((0, 0)):
            Hole(F4_D / 2)

    # F5 (through all)
    with Locations(Plane.YZ):
        with Locations((-40, 90), (-40, 70), (-40, 50), (-40, 30), (-40, -20), (-40, -40), (-40, -60), (-40, -80)):
            Hole(F5_D / 2)

    # F6 (through all)
    with Locations(Plane.YZ):
        with Locations((-40, -95), (-15, -95), (15, -95), (40, -95)):
            Hole(F6_D / 2)

    # F7
    with Locations(Plane.YZ):
        with Locations((34.75, 34.75), (-34.75, 34.75), (-34.75, -34.75), (34.75, -34.75)):
            Hole(F7_D / 2, depth=F7_DEPTH)
            with Locations((0, 0, -(F7_DEPTH + F7_TIP / 2))):  # 118° drill point
                Cone(0, F7_D / 2, F7_TIP, mode=Mode.SUBTRACT)


solid = f1.part
